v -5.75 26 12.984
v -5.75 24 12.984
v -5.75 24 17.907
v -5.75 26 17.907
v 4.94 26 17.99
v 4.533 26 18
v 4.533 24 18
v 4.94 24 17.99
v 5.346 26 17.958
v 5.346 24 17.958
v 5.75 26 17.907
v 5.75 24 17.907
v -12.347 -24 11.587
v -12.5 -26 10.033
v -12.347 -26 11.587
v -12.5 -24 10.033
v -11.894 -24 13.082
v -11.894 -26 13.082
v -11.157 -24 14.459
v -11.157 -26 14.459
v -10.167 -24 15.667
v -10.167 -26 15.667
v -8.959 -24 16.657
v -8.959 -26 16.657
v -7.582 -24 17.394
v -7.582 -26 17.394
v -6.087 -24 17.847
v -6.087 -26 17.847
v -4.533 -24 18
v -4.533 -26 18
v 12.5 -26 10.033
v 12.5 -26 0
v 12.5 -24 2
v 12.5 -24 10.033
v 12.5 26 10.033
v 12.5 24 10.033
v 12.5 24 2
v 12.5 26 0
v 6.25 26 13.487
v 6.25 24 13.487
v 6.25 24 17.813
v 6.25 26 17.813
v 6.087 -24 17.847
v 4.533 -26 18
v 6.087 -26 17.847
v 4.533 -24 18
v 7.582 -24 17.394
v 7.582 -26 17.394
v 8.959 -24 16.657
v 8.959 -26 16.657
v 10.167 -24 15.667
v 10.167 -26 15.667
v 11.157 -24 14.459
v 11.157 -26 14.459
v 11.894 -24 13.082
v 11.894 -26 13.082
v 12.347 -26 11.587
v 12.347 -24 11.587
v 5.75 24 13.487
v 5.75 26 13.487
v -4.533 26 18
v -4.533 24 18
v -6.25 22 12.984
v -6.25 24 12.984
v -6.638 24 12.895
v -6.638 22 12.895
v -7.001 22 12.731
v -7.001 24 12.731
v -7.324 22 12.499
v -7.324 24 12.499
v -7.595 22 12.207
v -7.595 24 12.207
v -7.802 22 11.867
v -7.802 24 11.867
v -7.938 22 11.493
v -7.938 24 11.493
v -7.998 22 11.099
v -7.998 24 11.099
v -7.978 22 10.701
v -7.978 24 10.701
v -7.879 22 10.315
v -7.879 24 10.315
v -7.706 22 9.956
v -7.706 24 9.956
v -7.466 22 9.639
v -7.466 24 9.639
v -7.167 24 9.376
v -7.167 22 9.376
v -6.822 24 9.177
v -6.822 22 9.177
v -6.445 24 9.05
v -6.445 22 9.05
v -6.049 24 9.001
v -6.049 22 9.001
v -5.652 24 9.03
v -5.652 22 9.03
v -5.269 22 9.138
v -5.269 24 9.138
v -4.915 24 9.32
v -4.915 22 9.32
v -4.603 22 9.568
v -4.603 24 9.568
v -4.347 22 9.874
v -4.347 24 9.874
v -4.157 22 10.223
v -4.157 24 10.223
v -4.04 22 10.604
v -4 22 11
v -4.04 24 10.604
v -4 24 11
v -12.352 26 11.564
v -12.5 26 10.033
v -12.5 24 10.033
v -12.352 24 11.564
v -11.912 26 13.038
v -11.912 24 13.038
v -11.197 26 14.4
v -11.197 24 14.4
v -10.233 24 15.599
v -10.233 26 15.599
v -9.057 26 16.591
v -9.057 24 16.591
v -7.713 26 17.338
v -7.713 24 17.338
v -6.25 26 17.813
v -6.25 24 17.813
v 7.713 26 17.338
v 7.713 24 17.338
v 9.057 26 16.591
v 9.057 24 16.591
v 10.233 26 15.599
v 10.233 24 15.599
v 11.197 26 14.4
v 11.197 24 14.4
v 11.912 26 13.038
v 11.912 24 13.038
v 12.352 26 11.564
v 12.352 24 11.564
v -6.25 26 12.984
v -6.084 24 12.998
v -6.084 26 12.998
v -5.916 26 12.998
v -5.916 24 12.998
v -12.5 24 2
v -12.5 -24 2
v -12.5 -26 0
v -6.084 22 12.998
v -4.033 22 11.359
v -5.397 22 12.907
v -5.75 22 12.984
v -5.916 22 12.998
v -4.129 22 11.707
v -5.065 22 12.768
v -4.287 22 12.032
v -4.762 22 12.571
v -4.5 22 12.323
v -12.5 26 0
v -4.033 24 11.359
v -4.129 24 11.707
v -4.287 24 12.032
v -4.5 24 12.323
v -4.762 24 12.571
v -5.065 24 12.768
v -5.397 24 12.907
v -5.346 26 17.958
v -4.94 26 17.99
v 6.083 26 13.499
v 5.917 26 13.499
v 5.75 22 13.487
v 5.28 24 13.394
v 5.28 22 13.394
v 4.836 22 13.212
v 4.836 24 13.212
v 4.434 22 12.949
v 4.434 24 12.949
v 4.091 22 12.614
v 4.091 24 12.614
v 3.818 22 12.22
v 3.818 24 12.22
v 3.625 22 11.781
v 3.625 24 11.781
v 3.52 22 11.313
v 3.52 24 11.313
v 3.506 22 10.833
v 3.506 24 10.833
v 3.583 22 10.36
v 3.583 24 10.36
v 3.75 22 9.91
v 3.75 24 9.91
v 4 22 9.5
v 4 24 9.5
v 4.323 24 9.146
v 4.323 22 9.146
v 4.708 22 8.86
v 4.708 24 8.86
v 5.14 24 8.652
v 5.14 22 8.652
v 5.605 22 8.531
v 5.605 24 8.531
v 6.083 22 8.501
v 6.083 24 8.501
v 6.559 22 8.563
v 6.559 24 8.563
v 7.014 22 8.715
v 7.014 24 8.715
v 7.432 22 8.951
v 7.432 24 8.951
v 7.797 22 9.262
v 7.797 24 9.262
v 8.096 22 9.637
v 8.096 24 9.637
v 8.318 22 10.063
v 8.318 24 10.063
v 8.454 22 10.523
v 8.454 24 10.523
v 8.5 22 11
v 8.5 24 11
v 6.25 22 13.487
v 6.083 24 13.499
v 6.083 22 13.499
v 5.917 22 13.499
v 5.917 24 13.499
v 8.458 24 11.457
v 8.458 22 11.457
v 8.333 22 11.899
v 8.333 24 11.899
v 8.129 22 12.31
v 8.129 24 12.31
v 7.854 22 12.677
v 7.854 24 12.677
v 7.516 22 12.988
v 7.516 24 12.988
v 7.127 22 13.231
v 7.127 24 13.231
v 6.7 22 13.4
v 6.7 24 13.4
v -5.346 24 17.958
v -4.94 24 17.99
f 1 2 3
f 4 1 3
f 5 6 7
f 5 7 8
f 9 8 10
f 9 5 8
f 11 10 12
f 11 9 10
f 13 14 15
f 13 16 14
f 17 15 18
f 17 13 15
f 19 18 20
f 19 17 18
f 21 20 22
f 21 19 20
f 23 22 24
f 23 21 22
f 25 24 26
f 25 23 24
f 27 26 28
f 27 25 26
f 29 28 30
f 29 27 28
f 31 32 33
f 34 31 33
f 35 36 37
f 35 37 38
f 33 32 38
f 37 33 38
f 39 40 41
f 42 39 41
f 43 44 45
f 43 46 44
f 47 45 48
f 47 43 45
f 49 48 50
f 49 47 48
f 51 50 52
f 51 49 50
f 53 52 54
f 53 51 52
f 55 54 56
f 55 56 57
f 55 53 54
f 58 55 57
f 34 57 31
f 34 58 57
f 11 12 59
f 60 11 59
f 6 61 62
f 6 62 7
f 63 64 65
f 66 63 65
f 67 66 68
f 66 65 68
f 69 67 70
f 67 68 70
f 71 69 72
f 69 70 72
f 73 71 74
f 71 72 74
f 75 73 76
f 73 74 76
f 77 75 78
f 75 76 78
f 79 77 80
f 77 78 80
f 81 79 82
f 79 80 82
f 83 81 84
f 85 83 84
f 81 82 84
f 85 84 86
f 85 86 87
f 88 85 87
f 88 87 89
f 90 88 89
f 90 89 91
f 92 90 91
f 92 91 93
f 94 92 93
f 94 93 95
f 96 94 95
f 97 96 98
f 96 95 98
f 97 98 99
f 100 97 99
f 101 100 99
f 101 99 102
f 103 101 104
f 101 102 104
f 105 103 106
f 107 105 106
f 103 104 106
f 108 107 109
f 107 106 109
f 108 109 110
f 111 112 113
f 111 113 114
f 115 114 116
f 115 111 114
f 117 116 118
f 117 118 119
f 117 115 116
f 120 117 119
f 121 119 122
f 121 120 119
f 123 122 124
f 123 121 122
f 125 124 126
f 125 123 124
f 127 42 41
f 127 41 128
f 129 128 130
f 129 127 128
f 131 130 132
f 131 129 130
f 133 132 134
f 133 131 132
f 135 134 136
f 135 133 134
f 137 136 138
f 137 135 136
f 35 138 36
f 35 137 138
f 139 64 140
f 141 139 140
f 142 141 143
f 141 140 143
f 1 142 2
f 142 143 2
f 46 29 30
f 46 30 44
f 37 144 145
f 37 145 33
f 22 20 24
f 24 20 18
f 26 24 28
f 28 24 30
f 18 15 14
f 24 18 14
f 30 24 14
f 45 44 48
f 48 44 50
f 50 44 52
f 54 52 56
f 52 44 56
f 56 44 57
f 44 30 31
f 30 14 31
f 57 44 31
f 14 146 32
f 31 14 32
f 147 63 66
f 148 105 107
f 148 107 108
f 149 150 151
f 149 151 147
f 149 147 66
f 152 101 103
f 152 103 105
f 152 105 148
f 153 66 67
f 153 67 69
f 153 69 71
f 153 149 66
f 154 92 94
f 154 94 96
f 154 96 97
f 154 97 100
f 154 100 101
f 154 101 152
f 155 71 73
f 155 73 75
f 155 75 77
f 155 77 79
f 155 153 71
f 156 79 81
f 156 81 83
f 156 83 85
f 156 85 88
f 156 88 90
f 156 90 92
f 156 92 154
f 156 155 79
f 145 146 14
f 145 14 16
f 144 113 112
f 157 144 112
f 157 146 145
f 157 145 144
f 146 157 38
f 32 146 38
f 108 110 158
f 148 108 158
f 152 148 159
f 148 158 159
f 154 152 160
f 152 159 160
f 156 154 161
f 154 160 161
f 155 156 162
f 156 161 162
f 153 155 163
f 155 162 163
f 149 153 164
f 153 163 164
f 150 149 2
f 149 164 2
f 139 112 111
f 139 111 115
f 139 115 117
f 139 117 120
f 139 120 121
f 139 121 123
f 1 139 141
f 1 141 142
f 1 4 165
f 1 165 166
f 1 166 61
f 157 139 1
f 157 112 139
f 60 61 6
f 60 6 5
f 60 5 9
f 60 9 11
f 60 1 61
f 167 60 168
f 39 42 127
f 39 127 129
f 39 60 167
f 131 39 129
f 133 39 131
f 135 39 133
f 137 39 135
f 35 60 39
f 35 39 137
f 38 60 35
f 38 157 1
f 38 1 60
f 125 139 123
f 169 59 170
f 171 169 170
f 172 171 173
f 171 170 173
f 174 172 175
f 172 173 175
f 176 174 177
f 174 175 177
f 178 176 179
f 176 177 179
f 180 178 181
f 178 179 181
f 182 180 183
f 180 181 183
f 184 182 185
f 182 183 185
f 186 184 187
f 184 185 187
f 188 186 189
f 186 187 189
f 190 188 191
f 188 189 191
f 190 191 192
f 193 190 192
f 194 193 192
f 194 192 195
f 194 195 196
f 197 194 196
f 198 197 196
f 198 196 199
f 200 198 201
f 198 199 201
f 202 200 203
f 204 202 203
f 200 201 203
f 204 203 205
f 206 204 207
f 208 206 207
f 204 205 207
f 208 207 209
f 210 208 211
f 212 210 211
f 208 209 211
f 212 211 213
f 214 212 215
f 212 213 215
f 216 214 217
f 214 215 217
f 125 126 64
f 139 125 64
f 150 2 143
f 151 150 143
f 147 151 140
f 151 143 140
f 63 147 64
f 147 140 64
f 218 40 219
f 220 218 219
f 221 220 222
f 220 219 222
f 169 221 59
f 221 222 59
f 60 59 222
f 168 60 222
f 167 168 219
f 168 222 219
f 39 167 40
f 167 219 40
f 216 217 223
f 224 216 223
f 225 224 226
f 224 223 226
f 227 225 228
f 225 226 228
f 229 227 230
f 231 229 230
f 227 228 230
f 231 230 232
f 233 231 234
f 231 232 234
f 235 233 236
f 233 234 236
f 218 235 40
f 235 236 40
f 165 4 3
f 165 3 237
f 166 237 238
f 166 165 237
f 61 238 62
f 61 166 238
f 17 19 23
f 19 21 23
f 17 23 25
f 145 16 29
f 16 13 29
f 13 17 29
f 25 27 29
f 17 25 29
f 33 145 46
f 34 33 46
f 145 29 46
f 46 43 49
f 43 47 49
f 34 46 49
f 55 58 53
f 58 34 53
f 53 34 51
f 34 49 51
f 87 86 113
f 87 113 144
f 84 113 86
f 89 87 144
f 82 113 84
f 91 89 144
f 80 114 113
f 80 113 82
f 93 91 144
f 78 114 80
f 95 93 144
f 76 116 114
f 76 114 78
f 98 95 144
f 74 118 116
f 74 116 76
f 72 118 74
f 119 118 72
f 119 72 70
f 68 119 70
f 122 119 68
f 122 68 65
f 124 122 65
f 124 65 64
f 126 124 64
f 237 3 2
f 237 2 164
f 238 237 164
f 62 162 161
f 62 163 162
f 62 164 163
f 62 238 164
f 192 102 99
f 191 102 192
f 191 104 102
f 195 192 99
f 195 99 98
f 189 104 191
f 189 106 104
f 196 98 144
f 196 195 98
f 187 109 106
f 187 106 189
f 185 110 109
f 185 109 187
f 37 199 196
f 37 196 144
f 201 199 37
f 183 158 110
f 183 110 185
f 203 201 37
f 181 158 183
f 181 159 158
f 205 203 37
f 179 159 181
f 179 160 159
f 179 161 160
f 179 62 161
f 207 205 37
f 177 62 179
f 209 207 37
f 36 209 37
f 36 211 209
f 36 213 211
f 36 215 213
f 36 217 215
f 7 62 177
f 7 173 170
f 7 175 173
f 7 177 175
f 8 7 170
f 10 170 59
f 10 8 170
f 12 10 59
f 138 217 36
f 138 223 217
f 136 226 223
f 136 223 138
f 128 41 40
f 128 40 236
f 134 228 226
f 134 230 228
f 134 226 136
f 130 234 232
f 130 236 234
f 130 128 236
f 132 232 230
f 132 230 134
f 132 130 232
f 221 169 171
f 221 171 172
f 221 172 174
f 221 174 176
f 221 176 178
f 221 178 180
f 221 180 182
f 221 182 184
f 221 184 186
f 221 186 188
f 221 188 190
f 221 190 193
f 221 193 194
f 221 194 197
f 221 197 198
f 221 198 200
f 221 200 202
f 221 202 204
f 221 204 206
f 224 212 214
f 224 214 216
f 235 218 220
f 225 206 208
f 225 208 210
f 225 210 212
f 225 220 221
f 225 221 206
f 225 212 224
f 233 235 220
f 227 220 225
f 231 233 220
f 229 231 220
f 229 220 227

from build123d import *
from build123d import SkipClean  # not in build123d's __all__

# Parameters (mm, degrees)
F0_W     = 25
F0_H     = 52
F1_DEPTH = 18
F2_W     = 25
F2_H     = 48
F3_DEPTH = 16
F4_R     = 7.9669047558
F6_DEPTH = 2
F7_DEPTH = 2


with BuildPart() as f1:
    # F0 (on Top) → F1 (new body)
    with BuildSketch(Plane.XY):
        Rectangle(F0_W, F0_H)
    extrude(amount=F1_DEPTH)

    # F2 (on face) → F3 (cut)
    with BuildSketch(Plane.XY.offset(18)):
        Rectangle(F2_W, F2_H)
    extrude(amount=-F3_DEPTH, mode=Mode.SUBTRACT)

    # F4
    f4_edges = [f1.edges().sort_by_distance(p)[0] for p in [
        (-12.5, 25, 18),
        (12.5, 25, 18),
        (-12.5, -25, 18),
        (12.5, -25, 18),
    ]]
    fillet(f4_edges, radius=F4_R)

    # F5 (on face) → F6 (join)
    with BuildSketch(Plane.XZ.offset(-24)):
        with BuildLine():
            ThreePointArc((-4, 11), (-4.5, 12.3228756555), (-5.75, 12.9843134833))
            ThreePointArc((-5.75, 12.9843134833), (-6, 13), (-6.25, 12.9843134833))
            ThreePointArc((-6.25, 12.9843134833), (-7.3228756555, 9.5), (-4, 11))
        make_face()
        with BuildLine():
            ThreePointArc((5.75, 13.4874685928), (4.3229490169, 9.1459503782), (8.5, 11))
            ThreePointArc((8.5, 11), (7.8540496218, 12.6770509831), (6.25, 13.4874685928))
            ThreePointArc((6.25, 13.4874685928), (6, 13.5), (5.75, 13.4874685928))
        make_face()
    extrude(amount=F6_DEPTH)

    # F5 (on face) → F7 (cut, through all)
    with BuildSketch(Plane.XZ.offset(-24)):
        with BuildLine():
            Line((-5.75, 12.9843134833), (-5.75, 17.9065134474))
            ThreePointArc((-5.75, 17.9065134474), (-6.0007481681, 17.8636486271), (-6.25, 17.8128002159))
            Line((-6.25, 17.8128002159), (-6.25, 12.9843134833))
            ThreePointArc((-6.25, 12.9843134833), (-6, 13), (-5.75, 12.9843134833))
        make_face()
        with BuildLine():
            ThreePointArc((5.75, 13.4874685928), (6, 13.5), (6.25, 13.4874685928))
            Line((6.25, 13.4874685928), (6.25, 17.8128002159))
            ThreePointArc((6.25, 17.8128002159), (6.0007481681, 17.8636486271), (5.75, 17.9065134474))
            Line((5.75, 17.9065134474), (5.75, 13.4874685928))
        make_face()
    with SkipClean():  # cleaning this boolean's faces spoils the solid; the shape is the same uncleaned
        extrude(amount=-F7_DEPTH, mode=Mode.SUBTRACT)


solid = f1.part
